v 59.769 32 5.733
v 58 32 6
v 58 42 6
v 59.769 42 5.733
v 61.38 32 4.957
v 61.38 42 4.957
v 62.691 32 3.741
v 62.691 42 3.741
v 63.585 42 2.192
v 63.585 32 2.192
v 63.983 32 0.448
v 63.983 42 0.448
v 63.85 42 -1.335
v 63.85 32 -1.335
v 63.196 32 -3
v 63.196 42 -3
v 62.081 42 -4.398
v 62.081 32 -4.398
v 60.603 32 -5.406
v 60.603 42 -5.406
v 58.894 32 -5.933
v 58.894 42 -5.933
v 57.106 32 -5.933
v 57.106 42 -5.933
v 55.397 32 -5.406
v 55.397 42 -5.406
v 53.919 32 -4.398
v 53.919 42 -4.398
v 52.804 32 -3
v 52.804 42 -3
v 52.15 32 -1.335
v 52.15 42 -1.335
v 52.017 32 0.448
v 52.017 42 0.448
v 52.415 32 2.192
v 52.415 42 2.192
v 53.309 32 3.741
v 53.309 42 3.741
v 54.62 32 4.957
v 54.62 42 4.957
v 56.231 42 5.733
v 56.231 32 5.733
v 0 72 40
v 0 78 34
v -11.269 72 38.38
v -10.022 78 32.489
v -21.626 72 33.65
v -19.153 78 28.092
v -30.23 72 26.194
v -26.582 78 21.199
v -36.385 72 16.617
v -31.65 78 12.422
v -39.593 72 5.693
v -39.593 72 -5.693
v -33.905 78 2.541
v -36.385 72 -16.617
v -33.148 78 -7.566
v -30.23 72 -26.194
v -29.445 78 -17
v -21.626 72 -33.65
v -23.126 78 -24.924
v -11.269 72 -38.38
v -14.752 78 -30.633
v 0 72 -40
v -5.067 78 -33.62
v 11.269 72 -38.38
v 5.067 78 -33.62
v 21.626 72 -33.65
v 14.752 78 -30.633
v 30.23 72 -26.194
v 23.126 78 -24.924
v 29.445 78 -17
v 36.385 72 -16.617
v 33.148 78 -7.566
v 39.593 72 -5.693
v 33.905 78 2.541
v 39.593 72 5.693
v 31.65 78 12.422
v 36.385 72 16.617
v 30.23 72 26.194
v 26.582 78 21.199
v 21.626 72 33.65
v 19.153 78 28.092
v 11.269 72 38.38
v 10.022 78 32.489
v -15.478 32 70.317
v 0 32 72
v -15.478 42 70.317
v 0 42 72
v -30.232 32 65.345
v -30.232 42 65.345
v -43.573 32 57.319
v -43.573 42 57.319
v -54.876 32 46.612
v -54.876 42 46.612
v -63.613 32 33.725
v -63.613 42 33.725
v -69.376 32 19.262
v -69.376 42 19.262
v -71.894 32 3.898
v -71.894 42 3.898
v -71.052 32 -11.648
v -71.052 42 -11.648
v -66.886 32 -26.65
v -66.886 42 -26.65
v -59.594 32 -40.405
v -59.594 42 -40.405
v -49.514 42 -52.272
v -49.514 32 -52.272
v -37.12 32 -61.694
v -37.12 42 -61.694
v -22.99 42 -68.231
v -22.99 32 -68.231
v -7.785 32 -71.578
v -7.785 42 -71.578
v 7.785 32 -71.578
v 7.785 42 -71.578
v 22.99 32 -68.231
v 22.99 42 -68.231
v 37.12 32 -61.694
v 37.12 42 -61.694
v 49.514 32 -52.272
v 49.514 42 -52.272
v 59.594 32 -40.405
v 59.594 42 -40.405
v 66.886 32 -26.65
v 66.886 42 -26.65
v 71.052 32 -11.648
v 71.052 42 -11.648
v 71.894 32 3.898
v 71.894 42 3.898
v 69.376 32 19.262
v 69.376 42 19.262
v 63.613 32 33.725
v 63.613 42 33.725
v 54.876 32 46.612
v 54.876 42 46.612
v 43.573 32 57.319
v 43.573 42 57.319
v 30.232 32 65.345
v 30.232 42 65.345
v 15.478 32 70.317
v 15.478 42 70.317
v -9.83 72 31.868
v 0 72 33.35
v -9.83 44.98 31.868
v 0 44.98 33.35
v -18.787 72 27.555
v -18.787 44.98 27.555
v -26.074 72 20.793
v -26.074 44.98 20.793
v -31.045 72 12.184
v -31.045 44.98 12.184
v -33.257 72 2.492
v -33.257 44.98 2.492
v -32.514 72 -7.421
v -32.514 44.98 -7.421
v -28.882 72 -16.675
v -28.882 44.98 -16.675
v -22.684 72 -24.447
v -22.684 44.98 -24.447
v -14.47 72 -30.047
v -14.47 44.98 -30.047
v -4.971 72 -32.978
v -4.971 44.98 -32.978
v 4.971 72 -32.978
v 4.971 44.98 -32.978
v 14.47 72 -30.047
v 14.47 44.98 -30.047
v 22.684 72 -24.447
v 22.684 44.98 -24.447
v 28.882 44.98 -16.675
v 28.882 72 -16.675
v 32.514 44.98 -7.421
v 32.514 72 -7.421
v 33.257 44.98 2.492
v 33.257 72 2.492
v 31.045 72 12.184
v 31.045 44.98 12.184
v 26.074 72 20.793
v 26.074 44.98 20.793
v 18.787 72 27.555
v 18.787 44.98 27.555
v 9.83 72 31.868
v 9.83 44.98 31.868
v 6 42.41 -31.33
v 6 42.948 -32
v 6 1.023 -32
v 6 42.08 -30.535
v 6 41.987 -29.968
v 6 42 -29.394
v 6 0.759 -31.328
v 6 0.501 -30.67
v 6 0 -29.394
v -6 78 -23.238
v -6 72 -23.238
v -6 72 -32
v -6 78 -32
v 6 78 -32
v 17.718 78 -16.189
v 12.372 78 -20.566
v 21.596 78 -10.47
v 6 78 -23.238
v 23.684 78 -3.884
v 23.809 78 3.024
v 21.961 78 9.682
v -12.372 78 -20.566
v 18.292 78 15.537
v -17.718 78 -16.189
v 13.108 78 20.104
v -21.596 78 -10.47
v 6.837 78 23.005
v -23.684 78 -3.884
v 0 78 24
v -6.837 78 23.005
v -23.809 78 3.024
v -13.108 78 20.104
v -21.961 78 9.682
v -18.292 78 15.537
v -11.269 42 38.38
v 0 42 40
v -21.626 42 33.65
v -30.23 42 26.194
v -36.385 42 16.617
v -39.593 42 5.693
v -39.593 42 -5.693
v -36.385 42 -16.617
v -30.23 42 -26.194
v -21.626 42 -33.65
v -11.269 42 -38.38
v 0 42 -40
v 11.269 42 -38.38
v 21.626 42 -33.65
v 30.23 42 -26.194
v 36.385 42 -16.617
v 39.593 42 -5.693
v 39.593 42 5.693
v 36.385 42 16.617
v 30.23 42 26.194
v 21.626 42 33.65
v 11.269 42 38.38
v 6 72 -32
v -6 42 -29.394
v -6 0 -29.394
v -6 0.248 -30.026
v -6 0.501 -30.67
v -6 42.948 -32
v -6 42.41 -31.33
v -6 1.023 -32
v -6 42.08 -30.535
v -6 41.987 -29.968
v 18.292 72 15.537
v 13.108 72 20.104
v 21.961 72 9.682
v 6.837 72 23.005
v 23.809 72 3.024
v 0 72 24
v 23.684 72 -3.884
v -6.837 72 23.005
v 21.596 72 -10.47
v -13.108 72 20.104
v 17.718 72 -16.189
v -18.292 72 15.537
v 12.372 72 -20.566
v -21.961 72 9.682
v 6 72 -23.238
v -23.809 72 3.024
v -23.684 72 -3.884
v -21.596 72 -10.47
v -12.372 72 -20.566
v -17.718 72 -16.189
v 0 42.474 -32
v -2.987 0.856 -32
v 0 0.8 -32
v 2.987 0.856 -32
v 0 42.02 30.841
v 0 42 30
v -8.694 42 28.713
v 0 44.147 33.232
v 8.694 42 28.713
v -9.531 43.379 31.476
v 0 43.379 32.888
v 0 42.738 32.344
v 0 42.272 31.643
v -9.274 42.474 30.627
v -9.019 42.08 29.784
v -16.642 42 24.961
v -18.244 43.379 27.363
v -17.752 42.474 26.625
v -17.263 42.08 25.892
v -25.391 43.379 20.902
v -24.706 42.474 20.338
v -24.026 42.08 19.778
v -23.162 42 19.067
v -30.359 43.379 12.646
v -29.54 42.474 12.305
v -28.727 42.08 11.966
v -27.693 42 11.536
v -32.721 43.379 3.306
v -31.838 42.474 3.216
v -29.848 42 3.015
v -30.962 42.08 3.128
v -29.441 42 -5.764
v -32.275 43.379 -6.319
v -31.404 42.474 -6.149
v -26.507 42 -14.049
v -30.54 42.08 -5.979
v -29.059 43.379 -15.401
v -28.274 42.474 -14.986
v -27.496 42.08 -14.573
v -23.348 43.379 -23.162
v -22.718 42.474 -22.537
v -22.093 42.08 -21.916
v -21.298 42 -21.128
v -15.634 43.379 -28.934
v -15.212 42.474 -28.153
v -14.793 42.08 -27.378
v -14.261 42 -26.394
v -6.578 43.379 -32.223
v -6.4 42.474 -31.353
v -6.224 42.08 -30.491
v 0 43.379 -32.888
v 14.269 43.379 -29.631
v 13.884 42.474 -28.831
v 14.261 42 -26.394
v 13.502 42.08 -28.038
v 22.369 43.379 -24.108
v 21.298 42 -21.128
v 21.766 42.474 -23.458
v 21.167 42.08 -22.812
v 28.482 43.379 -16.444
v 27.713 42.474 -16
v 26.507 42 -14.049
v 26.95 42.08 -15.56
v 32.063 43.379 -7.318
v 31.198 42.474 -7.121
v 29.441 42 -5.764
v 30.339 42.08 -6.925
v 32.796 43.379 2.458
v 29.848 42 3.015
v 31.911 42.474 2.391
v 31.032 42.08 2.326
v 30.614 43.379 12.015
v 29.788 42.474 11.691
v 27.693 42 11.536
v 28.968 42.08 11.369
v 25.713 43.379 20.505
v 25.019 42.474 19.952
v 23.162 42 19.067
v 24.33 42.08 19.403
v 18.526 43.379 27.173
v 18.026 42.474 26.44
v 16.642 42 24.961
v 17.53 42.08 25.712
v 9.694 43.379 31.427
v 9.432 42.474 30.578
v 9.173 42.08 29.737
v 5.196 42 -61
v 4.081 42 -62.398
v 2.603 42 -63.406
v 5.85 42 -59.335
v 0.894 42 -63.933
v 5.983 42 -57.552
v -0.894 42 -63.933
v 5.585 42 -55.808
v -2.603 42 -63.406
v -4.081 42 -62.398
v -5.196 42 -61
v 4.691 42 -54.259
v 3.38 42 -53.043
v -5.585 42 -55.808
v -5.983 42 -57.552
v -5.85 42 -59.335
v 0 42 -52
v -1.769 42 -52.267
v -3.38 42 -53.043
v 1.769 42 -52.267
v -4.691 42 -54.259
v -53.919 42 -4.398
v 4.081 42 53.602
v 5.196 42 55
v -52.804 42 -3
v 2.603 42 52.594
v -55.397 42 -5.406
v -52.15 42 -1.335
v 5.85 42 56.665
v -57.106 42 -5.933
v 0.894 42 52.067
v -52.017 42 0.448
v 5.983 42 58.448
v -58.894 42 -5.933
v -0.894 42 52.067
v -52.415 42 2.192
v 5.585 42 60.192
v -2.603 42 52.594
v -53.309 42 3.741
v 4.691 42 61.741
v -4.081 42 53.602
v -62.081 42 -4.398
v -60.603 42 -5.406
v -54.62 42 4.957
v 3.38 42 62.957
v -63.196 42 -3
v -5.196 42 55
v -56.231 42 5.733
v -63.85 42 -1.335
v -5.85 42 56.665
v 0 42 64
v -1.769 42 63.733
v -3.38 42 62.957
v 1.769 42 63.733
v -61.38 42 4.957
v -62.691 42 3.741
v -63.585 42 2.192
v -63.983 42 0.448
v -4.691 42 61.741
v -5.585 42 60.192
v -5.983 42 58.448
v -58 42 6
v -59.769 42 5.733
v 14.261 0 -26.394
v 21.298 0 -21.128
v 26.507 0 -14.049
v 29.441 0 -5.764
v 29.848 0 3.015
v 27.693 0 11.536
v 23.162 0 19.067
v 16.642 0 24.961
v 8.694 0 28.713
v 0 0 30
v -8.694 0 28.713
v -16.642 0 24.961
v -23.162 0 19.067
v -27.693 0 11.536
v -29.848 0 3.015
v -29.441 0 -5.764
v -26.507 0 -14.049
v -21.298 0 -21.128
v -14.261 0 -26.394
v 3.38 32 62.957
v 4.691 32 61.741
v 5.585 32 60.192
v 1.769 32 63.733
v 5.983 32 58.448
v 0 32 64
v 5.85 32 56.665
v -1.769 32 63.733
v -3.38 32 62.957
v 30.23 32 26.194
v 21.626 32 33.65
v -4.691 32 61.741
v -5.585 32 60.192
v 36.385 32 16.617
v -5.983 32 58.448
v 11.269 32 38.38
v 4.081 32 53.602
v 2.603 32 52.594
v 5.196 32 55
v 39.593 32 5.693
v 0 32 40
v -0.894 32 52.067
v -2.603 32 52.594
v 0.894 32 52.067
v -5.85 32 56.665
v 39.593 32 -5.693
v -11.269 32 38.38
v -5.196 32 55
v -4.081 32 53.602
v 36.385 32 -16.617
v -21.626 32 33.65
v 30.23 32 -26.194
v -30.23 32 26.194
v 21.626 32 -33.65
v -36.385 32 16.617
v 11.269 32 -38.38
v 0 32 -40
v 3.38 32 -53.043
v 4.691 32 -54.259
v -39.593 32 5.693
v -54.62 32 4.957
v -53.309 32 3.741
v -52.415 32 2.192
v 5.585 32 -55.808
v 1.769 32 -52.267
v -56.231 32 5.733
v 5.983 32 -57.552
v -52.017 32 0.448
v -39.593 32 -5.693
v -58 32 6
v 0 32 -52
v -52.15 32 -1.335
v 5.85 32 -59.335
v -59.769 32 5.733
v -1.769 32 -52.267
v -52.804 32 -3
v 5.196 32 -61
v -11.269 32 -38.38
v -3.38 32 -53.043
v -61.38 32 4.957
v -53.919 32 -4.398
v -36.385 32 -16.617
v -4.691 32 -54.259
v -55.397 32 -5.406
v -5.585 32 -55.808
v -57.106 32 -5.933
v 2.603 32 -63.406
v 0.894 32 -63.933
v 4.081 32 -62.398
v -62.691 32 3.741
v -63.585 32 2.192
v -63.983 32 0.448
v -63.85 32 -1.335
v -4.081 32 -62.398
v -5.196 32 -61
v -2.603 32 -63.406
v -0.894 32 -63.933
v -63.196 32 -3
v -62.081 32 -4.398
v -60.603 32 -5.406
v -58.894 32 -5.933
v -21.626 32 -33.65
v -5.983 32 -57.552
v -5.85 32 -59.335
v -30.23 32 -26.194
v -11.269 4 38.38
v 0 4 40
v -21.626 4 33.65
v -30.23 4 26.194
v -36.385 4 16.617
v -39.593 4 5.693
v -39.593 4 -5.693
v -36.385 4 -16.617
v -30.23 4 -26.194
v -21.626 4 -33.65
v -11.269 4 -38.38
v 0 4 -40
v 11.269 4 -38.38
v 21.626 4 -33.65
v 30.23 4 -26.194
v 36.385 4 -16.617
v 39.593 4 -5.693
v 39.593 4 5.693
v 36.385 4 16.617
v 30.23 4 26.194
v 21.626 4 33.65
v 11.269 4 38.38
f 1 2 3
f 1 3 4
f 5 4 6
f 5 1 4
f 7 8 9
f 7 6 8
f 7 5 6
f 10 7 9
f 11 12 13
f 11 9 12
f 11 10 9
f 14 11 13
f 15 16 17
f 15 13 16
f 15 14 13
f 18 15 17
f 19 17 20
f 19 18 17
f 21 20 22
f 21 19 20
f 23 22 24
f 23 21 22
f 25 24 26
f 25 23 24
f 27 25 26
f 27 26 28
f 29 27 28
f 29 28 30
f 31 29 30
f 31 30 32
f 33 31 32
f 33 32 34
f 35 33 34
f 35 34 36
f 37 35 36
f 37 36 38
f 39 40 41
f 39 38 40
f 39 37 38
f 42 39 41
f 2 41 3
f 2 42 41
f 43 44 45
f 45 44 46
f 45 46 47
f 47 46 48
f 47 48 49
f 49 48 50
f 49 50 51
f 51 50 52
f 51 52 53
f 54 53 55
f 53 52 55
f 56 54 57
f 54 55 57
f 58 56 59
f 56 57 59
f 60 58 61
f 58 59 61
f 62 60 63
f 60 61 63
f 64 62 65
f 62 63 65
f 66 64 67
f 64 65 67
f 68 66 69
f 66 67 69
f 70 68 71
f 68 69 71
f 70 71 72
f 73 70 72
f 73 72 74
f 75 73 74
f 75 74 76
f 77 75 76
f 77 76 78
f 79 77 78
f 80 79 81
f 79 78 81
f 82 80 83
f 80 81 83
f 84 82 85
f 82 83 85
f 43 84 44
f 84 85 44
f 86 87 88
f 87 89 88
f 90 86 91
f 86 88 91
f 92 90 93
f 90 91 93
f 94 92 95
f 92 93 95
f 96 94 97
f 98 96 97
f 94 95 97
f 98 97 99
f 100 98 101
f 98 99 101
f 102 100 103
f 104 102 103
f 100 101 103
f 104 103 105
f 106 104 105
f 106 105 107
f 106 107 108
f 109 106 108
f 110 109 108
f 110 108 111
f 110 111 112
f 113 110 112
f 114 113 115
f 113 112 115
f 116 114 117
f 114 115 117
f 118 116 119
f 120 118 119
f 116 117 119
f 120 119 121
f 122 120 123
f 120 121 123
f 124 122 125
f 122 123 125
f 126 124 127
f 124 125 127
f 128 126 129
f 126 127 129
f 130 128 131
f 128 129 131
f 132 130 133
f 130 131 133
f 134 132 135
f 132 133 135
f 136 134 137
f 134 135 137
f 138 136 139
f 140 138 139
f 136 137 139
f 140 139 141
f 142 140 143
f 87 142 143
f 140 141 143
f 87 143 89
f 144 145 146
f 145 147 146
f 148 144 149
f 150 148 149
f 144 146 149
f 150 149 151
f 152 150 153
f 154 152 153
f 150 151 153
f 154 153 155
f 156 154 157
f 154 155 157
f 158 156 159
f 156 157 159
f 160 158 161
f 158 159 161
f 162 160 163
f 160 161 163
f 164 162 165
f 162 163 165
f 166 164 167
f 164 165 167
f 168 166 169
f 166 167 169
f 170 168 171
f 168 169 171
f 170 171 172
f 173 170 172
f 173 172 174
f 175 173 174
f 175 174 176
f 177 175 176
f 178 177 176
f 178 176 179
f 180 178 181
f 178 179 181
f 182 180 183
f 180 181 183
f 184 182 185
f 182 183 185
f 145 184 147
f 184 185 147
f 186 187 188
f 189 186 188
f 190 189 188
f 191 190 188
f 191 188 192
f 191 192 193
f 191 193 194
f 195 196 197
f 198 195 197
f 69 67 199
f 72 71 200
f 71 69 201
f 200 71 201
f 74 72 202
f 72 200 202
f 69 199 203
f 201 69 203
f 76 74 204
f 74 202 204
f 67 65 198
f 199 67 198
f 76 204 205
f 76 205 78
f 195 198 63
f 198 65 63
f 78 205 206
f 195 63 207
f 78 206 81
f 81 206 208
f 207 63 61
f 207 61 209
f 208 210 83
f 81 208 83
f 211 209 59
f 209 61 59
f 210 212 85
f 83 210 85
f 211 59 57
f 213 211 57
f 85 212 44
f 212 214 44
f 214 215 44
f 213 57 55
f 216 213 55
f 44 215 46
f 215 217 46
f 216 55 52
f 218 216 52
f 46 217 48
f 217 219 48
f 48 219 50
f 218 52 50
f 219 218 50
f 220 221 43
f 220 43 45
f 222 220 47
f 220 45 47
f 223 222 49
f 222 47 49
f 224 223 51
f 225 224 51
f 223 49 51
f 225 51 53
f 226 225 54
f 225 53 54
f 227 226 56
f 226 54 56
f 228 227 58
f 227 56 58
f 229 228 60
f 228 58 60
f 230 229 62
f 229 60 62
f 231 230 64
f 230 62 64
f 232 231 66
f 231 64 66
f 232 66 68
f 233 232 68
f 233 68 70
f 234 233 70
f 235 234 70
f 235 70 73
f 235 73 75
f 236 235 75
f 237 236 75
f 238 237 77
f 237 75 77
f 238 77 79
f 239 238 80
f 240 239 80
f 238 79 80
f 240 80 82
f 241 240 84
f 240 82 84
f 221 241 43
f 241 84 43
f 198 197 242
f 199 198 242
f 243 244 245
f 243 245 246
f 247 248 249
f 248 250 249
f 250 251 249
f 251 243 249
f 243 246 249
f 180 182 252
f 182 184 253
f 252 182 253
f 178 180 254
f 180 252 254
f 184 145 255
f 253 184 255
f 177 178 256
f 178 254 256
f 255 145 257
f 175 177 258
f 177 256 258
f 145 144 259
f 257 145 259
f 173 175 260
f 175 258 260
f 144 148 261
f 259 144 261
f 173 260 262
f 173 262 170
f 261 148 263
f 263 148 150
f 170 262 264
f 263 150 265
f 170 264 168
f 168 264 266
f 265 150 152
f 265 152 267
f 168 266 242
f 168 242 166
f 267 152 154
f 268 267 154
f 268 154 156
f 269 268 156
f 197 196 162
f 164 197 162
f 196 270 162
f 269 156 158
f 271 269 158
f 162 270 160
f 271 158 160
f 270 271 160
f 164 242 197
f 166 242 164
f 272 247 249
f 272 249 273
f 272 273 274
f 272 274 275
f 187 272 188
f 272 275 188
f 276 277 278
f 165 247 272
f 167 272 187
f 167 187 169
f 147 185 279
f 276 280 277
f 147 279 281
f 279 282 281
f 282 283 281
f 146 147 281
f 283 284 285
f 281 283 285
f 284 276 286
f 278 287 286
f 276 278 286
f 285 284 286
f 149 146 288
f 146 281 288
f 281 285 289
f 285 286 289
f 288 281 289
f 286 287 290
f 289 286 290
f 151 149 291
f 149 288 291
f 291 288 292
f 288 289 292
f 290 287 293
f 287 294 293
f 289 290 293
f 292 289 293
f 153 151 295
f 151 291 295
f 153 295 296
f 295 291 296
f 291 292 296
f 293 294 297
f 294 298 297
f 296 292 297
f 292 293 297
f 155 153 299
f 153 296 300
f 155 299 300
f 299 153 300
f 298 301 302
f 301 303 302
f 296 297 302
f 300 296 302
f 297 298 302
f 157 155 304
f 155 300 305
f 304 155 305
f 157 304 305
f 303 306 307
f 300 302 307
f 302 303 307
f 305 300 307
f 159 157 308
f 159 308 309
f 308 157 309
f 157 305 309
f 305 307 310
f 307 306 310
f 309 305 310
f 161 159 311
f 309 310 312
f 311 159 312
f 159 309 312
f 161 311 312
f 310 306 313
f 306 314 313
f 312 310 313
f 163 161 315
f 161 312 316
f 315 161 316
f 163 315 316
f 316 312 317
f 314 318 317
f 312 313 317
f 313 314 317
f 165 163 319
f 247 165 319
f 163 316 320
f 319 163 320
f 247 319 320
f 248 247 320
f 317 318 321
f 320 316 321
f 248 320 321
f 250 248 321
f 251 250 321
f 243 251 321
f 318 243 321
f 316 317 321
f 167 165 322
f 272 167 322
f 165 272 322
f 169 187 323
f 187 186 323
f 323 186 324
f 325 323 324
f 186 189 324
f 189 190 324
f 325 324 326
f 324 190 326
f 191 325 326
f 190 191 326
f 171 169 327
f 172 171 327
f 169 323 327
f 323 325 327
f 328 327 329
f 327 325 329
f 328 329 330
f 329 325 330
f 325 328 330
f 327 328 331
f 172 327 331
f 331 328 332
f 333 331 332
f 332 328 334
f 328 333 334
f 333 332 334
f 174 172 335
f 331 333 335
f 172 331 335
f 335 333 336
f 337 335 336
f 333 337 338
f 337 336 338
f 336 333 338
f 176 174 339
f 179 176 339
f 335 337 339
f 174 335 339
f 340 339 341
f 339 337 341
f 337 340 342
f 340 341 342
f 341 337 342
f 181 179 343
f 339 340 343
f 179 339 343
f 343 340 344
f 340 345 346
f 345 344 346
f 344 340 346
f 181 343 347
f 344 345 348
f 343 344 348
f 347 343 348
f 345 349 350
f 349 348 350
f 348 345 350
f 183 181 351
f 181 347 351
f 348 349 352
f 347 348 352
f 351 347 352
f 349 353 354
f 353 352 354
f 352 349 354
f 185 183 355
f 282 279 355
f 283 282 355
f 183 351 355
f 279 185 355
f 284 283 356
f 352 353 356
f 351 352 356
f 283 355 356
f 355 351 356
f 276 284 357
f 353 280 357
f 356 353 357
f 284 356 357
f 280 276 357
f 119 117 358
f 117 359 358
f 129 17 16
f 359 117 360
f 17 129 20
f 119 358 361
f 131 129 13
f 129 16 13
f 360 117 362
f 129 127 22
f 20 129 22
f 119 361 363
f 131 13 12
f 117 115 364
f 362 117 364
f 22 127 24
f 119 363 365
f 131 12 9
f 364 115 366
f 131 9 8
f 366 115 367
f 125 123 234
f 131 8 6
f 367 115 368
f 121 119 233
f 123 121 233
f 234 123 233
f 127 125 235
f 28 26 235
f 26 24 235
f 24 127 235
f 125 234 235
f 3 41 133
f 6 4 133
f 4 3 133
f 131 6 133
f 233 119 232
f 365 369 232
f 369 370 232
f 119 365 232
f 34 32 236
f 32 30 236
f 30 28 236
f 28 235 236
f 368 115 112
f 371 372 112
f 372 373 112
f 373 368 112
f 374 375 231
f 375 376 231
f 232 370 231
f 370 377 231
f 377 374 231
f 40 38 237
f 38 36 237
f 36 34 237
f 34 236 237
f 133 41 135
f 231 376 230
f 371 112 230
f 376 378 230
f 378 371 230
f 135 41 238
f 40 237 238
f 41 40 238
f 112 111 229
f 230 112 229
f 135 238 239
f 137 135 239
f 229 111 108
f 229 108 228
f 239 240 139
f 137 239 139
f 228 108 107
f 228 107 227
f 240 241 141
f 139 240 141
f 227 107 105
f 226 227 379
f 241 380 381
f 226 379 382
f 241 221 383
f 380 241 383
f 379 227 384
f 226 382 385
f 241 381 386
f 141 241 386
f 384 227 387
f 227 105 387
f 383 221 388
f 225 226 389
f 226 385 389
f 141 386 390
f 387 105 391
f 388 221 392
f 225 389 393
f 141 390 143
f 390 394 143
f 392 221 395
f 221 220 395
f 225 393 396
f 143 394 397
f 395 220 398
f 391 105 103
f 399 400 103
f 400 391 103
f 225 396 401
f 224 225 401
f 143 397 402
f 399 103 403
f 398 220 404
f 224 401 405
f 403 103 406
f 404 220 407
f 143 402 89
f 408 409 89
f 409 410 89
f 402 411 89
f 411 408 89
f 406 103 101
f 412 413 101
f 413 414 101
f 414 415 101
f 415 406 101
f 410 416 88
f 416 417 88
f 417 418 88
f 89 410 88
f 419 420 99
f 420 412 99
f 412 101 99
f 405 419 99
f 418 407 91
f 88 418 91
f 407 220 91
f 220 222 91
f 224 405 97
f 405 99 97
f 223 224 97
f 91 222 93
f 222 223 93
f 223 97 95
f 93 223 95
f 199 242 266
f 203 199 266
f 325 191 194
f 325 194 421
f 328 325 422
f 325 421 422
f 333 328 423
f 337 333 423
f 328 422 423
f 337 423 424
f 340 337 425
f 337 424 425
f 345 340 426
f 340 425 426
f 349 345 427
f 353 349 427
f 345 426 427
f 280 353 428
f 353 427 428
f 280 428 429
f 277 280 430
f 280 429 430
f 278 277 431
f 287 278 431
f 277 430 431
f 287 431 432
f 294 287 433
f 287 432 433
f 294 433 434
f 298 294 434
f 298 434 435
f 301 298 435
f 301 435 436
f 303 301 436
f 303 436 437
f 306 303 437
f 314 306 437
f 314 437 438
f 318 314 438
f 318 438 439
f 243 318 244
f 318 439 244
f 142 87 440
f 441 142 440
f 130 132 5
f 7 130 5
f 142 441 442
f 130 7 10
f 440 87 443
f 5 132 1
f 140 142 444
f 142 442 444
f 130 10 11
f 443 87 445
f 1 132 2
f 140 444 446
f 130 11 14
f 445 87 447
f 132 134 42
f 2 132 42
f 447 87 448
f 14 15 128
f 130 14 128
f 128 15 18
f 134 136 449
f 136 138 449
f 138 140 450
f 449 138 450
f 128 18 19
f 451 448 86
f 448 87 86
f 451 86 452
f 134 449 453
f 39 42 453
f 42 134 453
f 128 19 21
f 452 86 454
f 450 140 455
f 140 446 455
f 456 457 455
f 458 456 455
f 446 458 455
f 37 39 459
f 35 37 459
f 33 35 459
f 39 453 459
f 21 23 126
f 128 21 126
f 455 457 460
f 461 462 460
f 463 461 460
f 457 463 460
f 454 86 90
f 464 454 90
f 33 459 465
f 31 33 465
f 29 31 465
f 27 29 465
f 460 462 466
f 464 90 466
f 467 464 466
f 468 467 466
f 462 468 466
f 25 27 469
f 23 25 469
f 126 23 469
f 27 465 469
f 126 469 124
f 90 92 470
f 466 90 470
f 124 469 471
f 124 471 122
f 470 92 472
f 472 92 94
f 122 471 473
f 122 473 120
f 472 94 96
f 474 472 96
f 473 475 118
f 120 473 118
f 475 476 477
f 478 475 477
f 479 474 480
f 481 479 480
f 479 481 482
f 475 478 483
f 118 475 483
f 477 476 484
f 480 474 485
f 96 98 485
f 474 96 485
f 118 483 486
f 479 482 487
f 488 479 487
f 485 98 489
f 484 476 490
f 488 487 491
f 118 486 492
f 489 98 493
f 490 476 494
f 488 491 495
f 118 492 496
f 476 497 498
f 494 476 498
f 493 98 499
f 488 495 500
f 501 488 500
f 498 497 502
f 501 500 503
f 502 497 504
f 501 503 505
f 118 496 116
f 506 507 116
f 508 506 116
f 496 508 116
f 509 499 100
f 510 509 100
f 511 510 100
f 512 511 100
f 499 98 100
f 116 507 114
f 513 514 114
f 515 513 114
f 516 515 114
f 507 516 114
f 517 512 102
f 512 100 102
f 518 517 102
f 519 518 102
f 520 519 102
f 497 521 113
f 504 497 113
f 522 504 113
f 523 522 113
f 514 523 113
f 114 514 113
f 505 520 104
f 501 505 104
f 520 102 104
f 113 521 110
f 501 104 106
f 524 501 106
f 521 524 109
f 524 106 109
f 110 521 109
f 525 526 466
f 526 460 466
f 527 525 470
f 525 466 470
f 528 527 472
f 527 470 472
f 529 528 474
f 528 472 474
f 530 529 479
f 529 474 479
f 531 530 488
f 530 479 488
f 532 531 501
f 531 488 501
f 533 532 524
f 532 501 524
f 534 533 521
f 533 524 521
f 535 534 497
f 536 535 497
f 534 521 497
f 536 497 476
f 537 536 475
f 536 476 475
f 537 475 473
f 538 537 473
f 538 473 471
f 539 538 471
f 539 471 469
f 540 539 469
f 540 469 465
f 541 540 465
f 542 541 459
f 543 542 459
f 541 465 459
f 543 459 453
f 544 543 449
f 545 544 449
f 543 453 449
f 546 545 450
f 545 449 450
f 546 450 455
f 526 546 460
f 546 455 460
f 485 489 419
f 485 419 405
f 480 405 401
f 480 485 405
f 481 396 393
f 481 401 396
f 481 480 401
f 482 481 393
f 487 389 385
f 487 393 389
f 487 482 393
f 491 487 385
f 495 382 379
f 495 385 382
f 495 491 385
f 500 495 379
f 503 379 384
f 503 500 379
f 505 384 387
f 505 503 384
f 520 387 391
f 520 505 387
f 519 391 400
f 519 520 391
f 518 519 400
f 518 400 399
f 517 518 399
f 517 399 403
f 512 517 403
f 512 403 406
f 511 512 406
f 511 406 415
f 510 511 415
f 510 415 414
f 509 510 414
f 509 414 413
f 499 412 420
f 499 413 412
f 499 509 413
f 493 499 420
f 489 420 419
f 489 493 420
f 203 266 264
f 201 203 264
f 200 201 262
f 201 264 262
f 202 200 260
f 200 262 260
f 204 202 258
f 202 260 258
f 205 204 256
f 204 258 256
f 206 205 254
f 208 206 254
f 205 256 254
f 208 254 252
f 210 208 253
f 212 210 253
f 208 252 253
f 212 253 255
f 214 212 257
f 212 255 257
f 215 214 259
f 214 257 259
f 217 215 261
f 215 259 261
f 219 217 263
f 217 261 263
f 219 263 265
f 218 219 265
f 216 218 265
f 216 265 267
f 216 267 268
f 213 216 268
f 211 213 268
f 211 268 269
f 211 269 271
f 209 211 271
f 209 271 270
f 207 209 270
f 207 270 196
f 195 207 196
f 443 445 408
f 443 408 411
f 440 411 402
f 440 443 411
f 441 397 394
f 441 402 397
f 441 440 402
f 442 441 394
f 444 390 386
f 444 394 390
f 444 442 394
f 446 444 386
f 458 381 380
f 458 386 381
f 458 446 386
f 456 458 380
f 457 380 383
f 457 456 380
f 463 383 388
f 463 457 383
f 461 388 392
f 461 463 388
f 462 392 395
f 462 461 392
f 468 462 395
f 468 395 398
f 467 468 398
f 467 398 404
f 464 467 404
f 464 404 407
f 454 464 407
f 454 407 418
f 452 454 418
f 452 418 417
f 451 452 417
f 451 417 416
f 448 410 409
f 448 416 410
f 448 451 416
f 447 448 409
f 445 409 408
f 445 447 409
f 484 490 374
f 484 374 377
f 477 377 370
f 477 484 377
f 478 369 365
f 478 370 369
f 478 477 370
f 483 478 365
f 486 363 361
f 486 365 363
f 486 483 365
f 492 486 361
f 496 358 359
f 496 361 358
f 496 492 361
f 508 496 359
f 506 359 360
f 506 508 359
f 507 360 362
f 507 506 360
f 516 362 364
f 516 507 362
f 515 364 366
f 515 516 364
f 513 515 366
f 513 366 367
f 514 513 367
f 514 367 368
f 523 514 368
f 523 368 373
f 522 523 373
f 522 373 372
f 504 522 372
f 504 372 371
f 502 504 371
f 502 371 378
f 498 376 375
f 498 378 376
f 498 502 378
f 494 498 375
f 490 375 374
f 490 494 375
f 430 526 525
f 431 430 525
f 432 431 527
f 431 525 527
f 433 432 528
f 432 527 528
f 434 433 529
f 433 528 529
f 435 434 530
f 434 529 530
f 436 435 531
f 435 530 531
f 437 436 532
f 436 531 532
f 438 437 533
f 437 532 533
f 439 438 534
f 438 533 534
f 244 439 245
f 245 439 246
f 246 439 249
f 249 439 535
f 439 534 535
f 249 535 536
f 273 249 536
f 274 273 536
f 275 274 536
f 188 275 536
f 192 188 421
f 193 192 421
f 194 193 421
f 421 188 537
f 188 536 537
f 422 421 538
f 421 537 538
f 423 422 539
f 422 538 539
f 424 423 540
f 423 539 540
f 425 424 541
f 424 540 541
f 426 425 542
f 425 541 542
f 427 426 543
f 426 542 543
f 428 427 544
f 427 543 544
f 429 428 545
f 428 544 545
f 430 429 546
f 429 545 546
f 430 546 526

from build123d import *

# Parameters (mm, degrees)
CUT_EXTRUDE1_DEPTH      = 129.265349959
CUT_EXTRUDE1_DEPTH_BACK = 129.265349959
CUT_EXTRUDE2_DEPTH      = 129.265350019
CUT_EXTRUDE2_DEPTH_BACK = 129.265350019
SKETCH3_R               = 6


with BuildPart() as part:
    # Sketch1 → Revolve2 (revolve)
    with BuildSketch(Plane.XY, mode=Mode.PRIVATE) as revolve2_sk:
        with BuildLine():
            Line((30, 0), (40, 4))
            Line((40, 4), (40, 32))
            Line((40, 32), (72, 32))
            Line((72, 32), (72, 42))
            Line((72, 42), (40, 42))
            Line((40, 42), (40, 72))
            Line((40, 72), (34, 78))
            Line((34, 78), (0, 78))
            Line((0, 78), (0, 72))
            Line((0, 72), (33.350051409, 72))
            Line((33.350051409, 72), (33.350051409, 44.979507344))
            ThreePointArc((33.350051409, 44.979507344), (32.343772274, 42.737838966), (30, 42))
            Line((30, 42), (30, 0))
        make_face()
    revolve(revolve2_sk.sketch.rotate(Axis((0, 106.766899484, 0), (0, -1, 0)), 90), axis=Axis((0, 106.766899484, 0), (0, -1, 0)))

    # Sketch2 → Cut-Extrude1 (cut, two sides: drawn at the far end of the back side and taken through both)
    with BuildSketch(Plane(origin=(0, 78, 0), x_dir=(1, 0, 0), z_dir=(0, 1, 0)).offset(-CUT_EXTRUDE1_DEPTH_BACK)):
        with BuildLine():
            Line((-6, 23.237900077), (-6, 32))
            Line((-6, 32), (6, 32))
            Line((6, 32), (6, 23.237900077))
            ThreePointArc((6, 23.237900077), (0, -24), (-6, 23.237900077))
        make_face()
    extrude(amount=CUT_EXTRUDE1_DEPTH + CUT_EXTRUDE1_DEPTH_BACK, mode=Mode.SUBTRACT)

    # Sketch3 → Cut-Extrude2 (cut, two sides: drawn at the far end of the back side and taken through both)
    with BuildSketch(Plane(origin=(0, 78, 0), x_dir=(1, 0, 0), z_dir=(0, 1, 0)).offset(-CUT_EXTRUDE2_DEPTH_BACK)):
        with Locations(Location((0, 58, 0), (0, 0, 270))):
            Circle(SKETCH3_R)
        with Locations(Location((58, 0, 0), (0, 0, 270))):
            Circle(SKETCH3_R)
        with Locations(Location((0, -58, 0), (0, 0, 270))):
            Circle(SKETCH3_R)
        with Locations(Location((-58, 0, 0), (0, 0, 270))):
            Circle(SKETCH3_R)
    extrude(amount=CUT_EXTRUDE2_DEPTH + CUT_EXTRUDE2_DEPTH_BACK, mode=Mode.SUBTRACT)


solid = part.part
